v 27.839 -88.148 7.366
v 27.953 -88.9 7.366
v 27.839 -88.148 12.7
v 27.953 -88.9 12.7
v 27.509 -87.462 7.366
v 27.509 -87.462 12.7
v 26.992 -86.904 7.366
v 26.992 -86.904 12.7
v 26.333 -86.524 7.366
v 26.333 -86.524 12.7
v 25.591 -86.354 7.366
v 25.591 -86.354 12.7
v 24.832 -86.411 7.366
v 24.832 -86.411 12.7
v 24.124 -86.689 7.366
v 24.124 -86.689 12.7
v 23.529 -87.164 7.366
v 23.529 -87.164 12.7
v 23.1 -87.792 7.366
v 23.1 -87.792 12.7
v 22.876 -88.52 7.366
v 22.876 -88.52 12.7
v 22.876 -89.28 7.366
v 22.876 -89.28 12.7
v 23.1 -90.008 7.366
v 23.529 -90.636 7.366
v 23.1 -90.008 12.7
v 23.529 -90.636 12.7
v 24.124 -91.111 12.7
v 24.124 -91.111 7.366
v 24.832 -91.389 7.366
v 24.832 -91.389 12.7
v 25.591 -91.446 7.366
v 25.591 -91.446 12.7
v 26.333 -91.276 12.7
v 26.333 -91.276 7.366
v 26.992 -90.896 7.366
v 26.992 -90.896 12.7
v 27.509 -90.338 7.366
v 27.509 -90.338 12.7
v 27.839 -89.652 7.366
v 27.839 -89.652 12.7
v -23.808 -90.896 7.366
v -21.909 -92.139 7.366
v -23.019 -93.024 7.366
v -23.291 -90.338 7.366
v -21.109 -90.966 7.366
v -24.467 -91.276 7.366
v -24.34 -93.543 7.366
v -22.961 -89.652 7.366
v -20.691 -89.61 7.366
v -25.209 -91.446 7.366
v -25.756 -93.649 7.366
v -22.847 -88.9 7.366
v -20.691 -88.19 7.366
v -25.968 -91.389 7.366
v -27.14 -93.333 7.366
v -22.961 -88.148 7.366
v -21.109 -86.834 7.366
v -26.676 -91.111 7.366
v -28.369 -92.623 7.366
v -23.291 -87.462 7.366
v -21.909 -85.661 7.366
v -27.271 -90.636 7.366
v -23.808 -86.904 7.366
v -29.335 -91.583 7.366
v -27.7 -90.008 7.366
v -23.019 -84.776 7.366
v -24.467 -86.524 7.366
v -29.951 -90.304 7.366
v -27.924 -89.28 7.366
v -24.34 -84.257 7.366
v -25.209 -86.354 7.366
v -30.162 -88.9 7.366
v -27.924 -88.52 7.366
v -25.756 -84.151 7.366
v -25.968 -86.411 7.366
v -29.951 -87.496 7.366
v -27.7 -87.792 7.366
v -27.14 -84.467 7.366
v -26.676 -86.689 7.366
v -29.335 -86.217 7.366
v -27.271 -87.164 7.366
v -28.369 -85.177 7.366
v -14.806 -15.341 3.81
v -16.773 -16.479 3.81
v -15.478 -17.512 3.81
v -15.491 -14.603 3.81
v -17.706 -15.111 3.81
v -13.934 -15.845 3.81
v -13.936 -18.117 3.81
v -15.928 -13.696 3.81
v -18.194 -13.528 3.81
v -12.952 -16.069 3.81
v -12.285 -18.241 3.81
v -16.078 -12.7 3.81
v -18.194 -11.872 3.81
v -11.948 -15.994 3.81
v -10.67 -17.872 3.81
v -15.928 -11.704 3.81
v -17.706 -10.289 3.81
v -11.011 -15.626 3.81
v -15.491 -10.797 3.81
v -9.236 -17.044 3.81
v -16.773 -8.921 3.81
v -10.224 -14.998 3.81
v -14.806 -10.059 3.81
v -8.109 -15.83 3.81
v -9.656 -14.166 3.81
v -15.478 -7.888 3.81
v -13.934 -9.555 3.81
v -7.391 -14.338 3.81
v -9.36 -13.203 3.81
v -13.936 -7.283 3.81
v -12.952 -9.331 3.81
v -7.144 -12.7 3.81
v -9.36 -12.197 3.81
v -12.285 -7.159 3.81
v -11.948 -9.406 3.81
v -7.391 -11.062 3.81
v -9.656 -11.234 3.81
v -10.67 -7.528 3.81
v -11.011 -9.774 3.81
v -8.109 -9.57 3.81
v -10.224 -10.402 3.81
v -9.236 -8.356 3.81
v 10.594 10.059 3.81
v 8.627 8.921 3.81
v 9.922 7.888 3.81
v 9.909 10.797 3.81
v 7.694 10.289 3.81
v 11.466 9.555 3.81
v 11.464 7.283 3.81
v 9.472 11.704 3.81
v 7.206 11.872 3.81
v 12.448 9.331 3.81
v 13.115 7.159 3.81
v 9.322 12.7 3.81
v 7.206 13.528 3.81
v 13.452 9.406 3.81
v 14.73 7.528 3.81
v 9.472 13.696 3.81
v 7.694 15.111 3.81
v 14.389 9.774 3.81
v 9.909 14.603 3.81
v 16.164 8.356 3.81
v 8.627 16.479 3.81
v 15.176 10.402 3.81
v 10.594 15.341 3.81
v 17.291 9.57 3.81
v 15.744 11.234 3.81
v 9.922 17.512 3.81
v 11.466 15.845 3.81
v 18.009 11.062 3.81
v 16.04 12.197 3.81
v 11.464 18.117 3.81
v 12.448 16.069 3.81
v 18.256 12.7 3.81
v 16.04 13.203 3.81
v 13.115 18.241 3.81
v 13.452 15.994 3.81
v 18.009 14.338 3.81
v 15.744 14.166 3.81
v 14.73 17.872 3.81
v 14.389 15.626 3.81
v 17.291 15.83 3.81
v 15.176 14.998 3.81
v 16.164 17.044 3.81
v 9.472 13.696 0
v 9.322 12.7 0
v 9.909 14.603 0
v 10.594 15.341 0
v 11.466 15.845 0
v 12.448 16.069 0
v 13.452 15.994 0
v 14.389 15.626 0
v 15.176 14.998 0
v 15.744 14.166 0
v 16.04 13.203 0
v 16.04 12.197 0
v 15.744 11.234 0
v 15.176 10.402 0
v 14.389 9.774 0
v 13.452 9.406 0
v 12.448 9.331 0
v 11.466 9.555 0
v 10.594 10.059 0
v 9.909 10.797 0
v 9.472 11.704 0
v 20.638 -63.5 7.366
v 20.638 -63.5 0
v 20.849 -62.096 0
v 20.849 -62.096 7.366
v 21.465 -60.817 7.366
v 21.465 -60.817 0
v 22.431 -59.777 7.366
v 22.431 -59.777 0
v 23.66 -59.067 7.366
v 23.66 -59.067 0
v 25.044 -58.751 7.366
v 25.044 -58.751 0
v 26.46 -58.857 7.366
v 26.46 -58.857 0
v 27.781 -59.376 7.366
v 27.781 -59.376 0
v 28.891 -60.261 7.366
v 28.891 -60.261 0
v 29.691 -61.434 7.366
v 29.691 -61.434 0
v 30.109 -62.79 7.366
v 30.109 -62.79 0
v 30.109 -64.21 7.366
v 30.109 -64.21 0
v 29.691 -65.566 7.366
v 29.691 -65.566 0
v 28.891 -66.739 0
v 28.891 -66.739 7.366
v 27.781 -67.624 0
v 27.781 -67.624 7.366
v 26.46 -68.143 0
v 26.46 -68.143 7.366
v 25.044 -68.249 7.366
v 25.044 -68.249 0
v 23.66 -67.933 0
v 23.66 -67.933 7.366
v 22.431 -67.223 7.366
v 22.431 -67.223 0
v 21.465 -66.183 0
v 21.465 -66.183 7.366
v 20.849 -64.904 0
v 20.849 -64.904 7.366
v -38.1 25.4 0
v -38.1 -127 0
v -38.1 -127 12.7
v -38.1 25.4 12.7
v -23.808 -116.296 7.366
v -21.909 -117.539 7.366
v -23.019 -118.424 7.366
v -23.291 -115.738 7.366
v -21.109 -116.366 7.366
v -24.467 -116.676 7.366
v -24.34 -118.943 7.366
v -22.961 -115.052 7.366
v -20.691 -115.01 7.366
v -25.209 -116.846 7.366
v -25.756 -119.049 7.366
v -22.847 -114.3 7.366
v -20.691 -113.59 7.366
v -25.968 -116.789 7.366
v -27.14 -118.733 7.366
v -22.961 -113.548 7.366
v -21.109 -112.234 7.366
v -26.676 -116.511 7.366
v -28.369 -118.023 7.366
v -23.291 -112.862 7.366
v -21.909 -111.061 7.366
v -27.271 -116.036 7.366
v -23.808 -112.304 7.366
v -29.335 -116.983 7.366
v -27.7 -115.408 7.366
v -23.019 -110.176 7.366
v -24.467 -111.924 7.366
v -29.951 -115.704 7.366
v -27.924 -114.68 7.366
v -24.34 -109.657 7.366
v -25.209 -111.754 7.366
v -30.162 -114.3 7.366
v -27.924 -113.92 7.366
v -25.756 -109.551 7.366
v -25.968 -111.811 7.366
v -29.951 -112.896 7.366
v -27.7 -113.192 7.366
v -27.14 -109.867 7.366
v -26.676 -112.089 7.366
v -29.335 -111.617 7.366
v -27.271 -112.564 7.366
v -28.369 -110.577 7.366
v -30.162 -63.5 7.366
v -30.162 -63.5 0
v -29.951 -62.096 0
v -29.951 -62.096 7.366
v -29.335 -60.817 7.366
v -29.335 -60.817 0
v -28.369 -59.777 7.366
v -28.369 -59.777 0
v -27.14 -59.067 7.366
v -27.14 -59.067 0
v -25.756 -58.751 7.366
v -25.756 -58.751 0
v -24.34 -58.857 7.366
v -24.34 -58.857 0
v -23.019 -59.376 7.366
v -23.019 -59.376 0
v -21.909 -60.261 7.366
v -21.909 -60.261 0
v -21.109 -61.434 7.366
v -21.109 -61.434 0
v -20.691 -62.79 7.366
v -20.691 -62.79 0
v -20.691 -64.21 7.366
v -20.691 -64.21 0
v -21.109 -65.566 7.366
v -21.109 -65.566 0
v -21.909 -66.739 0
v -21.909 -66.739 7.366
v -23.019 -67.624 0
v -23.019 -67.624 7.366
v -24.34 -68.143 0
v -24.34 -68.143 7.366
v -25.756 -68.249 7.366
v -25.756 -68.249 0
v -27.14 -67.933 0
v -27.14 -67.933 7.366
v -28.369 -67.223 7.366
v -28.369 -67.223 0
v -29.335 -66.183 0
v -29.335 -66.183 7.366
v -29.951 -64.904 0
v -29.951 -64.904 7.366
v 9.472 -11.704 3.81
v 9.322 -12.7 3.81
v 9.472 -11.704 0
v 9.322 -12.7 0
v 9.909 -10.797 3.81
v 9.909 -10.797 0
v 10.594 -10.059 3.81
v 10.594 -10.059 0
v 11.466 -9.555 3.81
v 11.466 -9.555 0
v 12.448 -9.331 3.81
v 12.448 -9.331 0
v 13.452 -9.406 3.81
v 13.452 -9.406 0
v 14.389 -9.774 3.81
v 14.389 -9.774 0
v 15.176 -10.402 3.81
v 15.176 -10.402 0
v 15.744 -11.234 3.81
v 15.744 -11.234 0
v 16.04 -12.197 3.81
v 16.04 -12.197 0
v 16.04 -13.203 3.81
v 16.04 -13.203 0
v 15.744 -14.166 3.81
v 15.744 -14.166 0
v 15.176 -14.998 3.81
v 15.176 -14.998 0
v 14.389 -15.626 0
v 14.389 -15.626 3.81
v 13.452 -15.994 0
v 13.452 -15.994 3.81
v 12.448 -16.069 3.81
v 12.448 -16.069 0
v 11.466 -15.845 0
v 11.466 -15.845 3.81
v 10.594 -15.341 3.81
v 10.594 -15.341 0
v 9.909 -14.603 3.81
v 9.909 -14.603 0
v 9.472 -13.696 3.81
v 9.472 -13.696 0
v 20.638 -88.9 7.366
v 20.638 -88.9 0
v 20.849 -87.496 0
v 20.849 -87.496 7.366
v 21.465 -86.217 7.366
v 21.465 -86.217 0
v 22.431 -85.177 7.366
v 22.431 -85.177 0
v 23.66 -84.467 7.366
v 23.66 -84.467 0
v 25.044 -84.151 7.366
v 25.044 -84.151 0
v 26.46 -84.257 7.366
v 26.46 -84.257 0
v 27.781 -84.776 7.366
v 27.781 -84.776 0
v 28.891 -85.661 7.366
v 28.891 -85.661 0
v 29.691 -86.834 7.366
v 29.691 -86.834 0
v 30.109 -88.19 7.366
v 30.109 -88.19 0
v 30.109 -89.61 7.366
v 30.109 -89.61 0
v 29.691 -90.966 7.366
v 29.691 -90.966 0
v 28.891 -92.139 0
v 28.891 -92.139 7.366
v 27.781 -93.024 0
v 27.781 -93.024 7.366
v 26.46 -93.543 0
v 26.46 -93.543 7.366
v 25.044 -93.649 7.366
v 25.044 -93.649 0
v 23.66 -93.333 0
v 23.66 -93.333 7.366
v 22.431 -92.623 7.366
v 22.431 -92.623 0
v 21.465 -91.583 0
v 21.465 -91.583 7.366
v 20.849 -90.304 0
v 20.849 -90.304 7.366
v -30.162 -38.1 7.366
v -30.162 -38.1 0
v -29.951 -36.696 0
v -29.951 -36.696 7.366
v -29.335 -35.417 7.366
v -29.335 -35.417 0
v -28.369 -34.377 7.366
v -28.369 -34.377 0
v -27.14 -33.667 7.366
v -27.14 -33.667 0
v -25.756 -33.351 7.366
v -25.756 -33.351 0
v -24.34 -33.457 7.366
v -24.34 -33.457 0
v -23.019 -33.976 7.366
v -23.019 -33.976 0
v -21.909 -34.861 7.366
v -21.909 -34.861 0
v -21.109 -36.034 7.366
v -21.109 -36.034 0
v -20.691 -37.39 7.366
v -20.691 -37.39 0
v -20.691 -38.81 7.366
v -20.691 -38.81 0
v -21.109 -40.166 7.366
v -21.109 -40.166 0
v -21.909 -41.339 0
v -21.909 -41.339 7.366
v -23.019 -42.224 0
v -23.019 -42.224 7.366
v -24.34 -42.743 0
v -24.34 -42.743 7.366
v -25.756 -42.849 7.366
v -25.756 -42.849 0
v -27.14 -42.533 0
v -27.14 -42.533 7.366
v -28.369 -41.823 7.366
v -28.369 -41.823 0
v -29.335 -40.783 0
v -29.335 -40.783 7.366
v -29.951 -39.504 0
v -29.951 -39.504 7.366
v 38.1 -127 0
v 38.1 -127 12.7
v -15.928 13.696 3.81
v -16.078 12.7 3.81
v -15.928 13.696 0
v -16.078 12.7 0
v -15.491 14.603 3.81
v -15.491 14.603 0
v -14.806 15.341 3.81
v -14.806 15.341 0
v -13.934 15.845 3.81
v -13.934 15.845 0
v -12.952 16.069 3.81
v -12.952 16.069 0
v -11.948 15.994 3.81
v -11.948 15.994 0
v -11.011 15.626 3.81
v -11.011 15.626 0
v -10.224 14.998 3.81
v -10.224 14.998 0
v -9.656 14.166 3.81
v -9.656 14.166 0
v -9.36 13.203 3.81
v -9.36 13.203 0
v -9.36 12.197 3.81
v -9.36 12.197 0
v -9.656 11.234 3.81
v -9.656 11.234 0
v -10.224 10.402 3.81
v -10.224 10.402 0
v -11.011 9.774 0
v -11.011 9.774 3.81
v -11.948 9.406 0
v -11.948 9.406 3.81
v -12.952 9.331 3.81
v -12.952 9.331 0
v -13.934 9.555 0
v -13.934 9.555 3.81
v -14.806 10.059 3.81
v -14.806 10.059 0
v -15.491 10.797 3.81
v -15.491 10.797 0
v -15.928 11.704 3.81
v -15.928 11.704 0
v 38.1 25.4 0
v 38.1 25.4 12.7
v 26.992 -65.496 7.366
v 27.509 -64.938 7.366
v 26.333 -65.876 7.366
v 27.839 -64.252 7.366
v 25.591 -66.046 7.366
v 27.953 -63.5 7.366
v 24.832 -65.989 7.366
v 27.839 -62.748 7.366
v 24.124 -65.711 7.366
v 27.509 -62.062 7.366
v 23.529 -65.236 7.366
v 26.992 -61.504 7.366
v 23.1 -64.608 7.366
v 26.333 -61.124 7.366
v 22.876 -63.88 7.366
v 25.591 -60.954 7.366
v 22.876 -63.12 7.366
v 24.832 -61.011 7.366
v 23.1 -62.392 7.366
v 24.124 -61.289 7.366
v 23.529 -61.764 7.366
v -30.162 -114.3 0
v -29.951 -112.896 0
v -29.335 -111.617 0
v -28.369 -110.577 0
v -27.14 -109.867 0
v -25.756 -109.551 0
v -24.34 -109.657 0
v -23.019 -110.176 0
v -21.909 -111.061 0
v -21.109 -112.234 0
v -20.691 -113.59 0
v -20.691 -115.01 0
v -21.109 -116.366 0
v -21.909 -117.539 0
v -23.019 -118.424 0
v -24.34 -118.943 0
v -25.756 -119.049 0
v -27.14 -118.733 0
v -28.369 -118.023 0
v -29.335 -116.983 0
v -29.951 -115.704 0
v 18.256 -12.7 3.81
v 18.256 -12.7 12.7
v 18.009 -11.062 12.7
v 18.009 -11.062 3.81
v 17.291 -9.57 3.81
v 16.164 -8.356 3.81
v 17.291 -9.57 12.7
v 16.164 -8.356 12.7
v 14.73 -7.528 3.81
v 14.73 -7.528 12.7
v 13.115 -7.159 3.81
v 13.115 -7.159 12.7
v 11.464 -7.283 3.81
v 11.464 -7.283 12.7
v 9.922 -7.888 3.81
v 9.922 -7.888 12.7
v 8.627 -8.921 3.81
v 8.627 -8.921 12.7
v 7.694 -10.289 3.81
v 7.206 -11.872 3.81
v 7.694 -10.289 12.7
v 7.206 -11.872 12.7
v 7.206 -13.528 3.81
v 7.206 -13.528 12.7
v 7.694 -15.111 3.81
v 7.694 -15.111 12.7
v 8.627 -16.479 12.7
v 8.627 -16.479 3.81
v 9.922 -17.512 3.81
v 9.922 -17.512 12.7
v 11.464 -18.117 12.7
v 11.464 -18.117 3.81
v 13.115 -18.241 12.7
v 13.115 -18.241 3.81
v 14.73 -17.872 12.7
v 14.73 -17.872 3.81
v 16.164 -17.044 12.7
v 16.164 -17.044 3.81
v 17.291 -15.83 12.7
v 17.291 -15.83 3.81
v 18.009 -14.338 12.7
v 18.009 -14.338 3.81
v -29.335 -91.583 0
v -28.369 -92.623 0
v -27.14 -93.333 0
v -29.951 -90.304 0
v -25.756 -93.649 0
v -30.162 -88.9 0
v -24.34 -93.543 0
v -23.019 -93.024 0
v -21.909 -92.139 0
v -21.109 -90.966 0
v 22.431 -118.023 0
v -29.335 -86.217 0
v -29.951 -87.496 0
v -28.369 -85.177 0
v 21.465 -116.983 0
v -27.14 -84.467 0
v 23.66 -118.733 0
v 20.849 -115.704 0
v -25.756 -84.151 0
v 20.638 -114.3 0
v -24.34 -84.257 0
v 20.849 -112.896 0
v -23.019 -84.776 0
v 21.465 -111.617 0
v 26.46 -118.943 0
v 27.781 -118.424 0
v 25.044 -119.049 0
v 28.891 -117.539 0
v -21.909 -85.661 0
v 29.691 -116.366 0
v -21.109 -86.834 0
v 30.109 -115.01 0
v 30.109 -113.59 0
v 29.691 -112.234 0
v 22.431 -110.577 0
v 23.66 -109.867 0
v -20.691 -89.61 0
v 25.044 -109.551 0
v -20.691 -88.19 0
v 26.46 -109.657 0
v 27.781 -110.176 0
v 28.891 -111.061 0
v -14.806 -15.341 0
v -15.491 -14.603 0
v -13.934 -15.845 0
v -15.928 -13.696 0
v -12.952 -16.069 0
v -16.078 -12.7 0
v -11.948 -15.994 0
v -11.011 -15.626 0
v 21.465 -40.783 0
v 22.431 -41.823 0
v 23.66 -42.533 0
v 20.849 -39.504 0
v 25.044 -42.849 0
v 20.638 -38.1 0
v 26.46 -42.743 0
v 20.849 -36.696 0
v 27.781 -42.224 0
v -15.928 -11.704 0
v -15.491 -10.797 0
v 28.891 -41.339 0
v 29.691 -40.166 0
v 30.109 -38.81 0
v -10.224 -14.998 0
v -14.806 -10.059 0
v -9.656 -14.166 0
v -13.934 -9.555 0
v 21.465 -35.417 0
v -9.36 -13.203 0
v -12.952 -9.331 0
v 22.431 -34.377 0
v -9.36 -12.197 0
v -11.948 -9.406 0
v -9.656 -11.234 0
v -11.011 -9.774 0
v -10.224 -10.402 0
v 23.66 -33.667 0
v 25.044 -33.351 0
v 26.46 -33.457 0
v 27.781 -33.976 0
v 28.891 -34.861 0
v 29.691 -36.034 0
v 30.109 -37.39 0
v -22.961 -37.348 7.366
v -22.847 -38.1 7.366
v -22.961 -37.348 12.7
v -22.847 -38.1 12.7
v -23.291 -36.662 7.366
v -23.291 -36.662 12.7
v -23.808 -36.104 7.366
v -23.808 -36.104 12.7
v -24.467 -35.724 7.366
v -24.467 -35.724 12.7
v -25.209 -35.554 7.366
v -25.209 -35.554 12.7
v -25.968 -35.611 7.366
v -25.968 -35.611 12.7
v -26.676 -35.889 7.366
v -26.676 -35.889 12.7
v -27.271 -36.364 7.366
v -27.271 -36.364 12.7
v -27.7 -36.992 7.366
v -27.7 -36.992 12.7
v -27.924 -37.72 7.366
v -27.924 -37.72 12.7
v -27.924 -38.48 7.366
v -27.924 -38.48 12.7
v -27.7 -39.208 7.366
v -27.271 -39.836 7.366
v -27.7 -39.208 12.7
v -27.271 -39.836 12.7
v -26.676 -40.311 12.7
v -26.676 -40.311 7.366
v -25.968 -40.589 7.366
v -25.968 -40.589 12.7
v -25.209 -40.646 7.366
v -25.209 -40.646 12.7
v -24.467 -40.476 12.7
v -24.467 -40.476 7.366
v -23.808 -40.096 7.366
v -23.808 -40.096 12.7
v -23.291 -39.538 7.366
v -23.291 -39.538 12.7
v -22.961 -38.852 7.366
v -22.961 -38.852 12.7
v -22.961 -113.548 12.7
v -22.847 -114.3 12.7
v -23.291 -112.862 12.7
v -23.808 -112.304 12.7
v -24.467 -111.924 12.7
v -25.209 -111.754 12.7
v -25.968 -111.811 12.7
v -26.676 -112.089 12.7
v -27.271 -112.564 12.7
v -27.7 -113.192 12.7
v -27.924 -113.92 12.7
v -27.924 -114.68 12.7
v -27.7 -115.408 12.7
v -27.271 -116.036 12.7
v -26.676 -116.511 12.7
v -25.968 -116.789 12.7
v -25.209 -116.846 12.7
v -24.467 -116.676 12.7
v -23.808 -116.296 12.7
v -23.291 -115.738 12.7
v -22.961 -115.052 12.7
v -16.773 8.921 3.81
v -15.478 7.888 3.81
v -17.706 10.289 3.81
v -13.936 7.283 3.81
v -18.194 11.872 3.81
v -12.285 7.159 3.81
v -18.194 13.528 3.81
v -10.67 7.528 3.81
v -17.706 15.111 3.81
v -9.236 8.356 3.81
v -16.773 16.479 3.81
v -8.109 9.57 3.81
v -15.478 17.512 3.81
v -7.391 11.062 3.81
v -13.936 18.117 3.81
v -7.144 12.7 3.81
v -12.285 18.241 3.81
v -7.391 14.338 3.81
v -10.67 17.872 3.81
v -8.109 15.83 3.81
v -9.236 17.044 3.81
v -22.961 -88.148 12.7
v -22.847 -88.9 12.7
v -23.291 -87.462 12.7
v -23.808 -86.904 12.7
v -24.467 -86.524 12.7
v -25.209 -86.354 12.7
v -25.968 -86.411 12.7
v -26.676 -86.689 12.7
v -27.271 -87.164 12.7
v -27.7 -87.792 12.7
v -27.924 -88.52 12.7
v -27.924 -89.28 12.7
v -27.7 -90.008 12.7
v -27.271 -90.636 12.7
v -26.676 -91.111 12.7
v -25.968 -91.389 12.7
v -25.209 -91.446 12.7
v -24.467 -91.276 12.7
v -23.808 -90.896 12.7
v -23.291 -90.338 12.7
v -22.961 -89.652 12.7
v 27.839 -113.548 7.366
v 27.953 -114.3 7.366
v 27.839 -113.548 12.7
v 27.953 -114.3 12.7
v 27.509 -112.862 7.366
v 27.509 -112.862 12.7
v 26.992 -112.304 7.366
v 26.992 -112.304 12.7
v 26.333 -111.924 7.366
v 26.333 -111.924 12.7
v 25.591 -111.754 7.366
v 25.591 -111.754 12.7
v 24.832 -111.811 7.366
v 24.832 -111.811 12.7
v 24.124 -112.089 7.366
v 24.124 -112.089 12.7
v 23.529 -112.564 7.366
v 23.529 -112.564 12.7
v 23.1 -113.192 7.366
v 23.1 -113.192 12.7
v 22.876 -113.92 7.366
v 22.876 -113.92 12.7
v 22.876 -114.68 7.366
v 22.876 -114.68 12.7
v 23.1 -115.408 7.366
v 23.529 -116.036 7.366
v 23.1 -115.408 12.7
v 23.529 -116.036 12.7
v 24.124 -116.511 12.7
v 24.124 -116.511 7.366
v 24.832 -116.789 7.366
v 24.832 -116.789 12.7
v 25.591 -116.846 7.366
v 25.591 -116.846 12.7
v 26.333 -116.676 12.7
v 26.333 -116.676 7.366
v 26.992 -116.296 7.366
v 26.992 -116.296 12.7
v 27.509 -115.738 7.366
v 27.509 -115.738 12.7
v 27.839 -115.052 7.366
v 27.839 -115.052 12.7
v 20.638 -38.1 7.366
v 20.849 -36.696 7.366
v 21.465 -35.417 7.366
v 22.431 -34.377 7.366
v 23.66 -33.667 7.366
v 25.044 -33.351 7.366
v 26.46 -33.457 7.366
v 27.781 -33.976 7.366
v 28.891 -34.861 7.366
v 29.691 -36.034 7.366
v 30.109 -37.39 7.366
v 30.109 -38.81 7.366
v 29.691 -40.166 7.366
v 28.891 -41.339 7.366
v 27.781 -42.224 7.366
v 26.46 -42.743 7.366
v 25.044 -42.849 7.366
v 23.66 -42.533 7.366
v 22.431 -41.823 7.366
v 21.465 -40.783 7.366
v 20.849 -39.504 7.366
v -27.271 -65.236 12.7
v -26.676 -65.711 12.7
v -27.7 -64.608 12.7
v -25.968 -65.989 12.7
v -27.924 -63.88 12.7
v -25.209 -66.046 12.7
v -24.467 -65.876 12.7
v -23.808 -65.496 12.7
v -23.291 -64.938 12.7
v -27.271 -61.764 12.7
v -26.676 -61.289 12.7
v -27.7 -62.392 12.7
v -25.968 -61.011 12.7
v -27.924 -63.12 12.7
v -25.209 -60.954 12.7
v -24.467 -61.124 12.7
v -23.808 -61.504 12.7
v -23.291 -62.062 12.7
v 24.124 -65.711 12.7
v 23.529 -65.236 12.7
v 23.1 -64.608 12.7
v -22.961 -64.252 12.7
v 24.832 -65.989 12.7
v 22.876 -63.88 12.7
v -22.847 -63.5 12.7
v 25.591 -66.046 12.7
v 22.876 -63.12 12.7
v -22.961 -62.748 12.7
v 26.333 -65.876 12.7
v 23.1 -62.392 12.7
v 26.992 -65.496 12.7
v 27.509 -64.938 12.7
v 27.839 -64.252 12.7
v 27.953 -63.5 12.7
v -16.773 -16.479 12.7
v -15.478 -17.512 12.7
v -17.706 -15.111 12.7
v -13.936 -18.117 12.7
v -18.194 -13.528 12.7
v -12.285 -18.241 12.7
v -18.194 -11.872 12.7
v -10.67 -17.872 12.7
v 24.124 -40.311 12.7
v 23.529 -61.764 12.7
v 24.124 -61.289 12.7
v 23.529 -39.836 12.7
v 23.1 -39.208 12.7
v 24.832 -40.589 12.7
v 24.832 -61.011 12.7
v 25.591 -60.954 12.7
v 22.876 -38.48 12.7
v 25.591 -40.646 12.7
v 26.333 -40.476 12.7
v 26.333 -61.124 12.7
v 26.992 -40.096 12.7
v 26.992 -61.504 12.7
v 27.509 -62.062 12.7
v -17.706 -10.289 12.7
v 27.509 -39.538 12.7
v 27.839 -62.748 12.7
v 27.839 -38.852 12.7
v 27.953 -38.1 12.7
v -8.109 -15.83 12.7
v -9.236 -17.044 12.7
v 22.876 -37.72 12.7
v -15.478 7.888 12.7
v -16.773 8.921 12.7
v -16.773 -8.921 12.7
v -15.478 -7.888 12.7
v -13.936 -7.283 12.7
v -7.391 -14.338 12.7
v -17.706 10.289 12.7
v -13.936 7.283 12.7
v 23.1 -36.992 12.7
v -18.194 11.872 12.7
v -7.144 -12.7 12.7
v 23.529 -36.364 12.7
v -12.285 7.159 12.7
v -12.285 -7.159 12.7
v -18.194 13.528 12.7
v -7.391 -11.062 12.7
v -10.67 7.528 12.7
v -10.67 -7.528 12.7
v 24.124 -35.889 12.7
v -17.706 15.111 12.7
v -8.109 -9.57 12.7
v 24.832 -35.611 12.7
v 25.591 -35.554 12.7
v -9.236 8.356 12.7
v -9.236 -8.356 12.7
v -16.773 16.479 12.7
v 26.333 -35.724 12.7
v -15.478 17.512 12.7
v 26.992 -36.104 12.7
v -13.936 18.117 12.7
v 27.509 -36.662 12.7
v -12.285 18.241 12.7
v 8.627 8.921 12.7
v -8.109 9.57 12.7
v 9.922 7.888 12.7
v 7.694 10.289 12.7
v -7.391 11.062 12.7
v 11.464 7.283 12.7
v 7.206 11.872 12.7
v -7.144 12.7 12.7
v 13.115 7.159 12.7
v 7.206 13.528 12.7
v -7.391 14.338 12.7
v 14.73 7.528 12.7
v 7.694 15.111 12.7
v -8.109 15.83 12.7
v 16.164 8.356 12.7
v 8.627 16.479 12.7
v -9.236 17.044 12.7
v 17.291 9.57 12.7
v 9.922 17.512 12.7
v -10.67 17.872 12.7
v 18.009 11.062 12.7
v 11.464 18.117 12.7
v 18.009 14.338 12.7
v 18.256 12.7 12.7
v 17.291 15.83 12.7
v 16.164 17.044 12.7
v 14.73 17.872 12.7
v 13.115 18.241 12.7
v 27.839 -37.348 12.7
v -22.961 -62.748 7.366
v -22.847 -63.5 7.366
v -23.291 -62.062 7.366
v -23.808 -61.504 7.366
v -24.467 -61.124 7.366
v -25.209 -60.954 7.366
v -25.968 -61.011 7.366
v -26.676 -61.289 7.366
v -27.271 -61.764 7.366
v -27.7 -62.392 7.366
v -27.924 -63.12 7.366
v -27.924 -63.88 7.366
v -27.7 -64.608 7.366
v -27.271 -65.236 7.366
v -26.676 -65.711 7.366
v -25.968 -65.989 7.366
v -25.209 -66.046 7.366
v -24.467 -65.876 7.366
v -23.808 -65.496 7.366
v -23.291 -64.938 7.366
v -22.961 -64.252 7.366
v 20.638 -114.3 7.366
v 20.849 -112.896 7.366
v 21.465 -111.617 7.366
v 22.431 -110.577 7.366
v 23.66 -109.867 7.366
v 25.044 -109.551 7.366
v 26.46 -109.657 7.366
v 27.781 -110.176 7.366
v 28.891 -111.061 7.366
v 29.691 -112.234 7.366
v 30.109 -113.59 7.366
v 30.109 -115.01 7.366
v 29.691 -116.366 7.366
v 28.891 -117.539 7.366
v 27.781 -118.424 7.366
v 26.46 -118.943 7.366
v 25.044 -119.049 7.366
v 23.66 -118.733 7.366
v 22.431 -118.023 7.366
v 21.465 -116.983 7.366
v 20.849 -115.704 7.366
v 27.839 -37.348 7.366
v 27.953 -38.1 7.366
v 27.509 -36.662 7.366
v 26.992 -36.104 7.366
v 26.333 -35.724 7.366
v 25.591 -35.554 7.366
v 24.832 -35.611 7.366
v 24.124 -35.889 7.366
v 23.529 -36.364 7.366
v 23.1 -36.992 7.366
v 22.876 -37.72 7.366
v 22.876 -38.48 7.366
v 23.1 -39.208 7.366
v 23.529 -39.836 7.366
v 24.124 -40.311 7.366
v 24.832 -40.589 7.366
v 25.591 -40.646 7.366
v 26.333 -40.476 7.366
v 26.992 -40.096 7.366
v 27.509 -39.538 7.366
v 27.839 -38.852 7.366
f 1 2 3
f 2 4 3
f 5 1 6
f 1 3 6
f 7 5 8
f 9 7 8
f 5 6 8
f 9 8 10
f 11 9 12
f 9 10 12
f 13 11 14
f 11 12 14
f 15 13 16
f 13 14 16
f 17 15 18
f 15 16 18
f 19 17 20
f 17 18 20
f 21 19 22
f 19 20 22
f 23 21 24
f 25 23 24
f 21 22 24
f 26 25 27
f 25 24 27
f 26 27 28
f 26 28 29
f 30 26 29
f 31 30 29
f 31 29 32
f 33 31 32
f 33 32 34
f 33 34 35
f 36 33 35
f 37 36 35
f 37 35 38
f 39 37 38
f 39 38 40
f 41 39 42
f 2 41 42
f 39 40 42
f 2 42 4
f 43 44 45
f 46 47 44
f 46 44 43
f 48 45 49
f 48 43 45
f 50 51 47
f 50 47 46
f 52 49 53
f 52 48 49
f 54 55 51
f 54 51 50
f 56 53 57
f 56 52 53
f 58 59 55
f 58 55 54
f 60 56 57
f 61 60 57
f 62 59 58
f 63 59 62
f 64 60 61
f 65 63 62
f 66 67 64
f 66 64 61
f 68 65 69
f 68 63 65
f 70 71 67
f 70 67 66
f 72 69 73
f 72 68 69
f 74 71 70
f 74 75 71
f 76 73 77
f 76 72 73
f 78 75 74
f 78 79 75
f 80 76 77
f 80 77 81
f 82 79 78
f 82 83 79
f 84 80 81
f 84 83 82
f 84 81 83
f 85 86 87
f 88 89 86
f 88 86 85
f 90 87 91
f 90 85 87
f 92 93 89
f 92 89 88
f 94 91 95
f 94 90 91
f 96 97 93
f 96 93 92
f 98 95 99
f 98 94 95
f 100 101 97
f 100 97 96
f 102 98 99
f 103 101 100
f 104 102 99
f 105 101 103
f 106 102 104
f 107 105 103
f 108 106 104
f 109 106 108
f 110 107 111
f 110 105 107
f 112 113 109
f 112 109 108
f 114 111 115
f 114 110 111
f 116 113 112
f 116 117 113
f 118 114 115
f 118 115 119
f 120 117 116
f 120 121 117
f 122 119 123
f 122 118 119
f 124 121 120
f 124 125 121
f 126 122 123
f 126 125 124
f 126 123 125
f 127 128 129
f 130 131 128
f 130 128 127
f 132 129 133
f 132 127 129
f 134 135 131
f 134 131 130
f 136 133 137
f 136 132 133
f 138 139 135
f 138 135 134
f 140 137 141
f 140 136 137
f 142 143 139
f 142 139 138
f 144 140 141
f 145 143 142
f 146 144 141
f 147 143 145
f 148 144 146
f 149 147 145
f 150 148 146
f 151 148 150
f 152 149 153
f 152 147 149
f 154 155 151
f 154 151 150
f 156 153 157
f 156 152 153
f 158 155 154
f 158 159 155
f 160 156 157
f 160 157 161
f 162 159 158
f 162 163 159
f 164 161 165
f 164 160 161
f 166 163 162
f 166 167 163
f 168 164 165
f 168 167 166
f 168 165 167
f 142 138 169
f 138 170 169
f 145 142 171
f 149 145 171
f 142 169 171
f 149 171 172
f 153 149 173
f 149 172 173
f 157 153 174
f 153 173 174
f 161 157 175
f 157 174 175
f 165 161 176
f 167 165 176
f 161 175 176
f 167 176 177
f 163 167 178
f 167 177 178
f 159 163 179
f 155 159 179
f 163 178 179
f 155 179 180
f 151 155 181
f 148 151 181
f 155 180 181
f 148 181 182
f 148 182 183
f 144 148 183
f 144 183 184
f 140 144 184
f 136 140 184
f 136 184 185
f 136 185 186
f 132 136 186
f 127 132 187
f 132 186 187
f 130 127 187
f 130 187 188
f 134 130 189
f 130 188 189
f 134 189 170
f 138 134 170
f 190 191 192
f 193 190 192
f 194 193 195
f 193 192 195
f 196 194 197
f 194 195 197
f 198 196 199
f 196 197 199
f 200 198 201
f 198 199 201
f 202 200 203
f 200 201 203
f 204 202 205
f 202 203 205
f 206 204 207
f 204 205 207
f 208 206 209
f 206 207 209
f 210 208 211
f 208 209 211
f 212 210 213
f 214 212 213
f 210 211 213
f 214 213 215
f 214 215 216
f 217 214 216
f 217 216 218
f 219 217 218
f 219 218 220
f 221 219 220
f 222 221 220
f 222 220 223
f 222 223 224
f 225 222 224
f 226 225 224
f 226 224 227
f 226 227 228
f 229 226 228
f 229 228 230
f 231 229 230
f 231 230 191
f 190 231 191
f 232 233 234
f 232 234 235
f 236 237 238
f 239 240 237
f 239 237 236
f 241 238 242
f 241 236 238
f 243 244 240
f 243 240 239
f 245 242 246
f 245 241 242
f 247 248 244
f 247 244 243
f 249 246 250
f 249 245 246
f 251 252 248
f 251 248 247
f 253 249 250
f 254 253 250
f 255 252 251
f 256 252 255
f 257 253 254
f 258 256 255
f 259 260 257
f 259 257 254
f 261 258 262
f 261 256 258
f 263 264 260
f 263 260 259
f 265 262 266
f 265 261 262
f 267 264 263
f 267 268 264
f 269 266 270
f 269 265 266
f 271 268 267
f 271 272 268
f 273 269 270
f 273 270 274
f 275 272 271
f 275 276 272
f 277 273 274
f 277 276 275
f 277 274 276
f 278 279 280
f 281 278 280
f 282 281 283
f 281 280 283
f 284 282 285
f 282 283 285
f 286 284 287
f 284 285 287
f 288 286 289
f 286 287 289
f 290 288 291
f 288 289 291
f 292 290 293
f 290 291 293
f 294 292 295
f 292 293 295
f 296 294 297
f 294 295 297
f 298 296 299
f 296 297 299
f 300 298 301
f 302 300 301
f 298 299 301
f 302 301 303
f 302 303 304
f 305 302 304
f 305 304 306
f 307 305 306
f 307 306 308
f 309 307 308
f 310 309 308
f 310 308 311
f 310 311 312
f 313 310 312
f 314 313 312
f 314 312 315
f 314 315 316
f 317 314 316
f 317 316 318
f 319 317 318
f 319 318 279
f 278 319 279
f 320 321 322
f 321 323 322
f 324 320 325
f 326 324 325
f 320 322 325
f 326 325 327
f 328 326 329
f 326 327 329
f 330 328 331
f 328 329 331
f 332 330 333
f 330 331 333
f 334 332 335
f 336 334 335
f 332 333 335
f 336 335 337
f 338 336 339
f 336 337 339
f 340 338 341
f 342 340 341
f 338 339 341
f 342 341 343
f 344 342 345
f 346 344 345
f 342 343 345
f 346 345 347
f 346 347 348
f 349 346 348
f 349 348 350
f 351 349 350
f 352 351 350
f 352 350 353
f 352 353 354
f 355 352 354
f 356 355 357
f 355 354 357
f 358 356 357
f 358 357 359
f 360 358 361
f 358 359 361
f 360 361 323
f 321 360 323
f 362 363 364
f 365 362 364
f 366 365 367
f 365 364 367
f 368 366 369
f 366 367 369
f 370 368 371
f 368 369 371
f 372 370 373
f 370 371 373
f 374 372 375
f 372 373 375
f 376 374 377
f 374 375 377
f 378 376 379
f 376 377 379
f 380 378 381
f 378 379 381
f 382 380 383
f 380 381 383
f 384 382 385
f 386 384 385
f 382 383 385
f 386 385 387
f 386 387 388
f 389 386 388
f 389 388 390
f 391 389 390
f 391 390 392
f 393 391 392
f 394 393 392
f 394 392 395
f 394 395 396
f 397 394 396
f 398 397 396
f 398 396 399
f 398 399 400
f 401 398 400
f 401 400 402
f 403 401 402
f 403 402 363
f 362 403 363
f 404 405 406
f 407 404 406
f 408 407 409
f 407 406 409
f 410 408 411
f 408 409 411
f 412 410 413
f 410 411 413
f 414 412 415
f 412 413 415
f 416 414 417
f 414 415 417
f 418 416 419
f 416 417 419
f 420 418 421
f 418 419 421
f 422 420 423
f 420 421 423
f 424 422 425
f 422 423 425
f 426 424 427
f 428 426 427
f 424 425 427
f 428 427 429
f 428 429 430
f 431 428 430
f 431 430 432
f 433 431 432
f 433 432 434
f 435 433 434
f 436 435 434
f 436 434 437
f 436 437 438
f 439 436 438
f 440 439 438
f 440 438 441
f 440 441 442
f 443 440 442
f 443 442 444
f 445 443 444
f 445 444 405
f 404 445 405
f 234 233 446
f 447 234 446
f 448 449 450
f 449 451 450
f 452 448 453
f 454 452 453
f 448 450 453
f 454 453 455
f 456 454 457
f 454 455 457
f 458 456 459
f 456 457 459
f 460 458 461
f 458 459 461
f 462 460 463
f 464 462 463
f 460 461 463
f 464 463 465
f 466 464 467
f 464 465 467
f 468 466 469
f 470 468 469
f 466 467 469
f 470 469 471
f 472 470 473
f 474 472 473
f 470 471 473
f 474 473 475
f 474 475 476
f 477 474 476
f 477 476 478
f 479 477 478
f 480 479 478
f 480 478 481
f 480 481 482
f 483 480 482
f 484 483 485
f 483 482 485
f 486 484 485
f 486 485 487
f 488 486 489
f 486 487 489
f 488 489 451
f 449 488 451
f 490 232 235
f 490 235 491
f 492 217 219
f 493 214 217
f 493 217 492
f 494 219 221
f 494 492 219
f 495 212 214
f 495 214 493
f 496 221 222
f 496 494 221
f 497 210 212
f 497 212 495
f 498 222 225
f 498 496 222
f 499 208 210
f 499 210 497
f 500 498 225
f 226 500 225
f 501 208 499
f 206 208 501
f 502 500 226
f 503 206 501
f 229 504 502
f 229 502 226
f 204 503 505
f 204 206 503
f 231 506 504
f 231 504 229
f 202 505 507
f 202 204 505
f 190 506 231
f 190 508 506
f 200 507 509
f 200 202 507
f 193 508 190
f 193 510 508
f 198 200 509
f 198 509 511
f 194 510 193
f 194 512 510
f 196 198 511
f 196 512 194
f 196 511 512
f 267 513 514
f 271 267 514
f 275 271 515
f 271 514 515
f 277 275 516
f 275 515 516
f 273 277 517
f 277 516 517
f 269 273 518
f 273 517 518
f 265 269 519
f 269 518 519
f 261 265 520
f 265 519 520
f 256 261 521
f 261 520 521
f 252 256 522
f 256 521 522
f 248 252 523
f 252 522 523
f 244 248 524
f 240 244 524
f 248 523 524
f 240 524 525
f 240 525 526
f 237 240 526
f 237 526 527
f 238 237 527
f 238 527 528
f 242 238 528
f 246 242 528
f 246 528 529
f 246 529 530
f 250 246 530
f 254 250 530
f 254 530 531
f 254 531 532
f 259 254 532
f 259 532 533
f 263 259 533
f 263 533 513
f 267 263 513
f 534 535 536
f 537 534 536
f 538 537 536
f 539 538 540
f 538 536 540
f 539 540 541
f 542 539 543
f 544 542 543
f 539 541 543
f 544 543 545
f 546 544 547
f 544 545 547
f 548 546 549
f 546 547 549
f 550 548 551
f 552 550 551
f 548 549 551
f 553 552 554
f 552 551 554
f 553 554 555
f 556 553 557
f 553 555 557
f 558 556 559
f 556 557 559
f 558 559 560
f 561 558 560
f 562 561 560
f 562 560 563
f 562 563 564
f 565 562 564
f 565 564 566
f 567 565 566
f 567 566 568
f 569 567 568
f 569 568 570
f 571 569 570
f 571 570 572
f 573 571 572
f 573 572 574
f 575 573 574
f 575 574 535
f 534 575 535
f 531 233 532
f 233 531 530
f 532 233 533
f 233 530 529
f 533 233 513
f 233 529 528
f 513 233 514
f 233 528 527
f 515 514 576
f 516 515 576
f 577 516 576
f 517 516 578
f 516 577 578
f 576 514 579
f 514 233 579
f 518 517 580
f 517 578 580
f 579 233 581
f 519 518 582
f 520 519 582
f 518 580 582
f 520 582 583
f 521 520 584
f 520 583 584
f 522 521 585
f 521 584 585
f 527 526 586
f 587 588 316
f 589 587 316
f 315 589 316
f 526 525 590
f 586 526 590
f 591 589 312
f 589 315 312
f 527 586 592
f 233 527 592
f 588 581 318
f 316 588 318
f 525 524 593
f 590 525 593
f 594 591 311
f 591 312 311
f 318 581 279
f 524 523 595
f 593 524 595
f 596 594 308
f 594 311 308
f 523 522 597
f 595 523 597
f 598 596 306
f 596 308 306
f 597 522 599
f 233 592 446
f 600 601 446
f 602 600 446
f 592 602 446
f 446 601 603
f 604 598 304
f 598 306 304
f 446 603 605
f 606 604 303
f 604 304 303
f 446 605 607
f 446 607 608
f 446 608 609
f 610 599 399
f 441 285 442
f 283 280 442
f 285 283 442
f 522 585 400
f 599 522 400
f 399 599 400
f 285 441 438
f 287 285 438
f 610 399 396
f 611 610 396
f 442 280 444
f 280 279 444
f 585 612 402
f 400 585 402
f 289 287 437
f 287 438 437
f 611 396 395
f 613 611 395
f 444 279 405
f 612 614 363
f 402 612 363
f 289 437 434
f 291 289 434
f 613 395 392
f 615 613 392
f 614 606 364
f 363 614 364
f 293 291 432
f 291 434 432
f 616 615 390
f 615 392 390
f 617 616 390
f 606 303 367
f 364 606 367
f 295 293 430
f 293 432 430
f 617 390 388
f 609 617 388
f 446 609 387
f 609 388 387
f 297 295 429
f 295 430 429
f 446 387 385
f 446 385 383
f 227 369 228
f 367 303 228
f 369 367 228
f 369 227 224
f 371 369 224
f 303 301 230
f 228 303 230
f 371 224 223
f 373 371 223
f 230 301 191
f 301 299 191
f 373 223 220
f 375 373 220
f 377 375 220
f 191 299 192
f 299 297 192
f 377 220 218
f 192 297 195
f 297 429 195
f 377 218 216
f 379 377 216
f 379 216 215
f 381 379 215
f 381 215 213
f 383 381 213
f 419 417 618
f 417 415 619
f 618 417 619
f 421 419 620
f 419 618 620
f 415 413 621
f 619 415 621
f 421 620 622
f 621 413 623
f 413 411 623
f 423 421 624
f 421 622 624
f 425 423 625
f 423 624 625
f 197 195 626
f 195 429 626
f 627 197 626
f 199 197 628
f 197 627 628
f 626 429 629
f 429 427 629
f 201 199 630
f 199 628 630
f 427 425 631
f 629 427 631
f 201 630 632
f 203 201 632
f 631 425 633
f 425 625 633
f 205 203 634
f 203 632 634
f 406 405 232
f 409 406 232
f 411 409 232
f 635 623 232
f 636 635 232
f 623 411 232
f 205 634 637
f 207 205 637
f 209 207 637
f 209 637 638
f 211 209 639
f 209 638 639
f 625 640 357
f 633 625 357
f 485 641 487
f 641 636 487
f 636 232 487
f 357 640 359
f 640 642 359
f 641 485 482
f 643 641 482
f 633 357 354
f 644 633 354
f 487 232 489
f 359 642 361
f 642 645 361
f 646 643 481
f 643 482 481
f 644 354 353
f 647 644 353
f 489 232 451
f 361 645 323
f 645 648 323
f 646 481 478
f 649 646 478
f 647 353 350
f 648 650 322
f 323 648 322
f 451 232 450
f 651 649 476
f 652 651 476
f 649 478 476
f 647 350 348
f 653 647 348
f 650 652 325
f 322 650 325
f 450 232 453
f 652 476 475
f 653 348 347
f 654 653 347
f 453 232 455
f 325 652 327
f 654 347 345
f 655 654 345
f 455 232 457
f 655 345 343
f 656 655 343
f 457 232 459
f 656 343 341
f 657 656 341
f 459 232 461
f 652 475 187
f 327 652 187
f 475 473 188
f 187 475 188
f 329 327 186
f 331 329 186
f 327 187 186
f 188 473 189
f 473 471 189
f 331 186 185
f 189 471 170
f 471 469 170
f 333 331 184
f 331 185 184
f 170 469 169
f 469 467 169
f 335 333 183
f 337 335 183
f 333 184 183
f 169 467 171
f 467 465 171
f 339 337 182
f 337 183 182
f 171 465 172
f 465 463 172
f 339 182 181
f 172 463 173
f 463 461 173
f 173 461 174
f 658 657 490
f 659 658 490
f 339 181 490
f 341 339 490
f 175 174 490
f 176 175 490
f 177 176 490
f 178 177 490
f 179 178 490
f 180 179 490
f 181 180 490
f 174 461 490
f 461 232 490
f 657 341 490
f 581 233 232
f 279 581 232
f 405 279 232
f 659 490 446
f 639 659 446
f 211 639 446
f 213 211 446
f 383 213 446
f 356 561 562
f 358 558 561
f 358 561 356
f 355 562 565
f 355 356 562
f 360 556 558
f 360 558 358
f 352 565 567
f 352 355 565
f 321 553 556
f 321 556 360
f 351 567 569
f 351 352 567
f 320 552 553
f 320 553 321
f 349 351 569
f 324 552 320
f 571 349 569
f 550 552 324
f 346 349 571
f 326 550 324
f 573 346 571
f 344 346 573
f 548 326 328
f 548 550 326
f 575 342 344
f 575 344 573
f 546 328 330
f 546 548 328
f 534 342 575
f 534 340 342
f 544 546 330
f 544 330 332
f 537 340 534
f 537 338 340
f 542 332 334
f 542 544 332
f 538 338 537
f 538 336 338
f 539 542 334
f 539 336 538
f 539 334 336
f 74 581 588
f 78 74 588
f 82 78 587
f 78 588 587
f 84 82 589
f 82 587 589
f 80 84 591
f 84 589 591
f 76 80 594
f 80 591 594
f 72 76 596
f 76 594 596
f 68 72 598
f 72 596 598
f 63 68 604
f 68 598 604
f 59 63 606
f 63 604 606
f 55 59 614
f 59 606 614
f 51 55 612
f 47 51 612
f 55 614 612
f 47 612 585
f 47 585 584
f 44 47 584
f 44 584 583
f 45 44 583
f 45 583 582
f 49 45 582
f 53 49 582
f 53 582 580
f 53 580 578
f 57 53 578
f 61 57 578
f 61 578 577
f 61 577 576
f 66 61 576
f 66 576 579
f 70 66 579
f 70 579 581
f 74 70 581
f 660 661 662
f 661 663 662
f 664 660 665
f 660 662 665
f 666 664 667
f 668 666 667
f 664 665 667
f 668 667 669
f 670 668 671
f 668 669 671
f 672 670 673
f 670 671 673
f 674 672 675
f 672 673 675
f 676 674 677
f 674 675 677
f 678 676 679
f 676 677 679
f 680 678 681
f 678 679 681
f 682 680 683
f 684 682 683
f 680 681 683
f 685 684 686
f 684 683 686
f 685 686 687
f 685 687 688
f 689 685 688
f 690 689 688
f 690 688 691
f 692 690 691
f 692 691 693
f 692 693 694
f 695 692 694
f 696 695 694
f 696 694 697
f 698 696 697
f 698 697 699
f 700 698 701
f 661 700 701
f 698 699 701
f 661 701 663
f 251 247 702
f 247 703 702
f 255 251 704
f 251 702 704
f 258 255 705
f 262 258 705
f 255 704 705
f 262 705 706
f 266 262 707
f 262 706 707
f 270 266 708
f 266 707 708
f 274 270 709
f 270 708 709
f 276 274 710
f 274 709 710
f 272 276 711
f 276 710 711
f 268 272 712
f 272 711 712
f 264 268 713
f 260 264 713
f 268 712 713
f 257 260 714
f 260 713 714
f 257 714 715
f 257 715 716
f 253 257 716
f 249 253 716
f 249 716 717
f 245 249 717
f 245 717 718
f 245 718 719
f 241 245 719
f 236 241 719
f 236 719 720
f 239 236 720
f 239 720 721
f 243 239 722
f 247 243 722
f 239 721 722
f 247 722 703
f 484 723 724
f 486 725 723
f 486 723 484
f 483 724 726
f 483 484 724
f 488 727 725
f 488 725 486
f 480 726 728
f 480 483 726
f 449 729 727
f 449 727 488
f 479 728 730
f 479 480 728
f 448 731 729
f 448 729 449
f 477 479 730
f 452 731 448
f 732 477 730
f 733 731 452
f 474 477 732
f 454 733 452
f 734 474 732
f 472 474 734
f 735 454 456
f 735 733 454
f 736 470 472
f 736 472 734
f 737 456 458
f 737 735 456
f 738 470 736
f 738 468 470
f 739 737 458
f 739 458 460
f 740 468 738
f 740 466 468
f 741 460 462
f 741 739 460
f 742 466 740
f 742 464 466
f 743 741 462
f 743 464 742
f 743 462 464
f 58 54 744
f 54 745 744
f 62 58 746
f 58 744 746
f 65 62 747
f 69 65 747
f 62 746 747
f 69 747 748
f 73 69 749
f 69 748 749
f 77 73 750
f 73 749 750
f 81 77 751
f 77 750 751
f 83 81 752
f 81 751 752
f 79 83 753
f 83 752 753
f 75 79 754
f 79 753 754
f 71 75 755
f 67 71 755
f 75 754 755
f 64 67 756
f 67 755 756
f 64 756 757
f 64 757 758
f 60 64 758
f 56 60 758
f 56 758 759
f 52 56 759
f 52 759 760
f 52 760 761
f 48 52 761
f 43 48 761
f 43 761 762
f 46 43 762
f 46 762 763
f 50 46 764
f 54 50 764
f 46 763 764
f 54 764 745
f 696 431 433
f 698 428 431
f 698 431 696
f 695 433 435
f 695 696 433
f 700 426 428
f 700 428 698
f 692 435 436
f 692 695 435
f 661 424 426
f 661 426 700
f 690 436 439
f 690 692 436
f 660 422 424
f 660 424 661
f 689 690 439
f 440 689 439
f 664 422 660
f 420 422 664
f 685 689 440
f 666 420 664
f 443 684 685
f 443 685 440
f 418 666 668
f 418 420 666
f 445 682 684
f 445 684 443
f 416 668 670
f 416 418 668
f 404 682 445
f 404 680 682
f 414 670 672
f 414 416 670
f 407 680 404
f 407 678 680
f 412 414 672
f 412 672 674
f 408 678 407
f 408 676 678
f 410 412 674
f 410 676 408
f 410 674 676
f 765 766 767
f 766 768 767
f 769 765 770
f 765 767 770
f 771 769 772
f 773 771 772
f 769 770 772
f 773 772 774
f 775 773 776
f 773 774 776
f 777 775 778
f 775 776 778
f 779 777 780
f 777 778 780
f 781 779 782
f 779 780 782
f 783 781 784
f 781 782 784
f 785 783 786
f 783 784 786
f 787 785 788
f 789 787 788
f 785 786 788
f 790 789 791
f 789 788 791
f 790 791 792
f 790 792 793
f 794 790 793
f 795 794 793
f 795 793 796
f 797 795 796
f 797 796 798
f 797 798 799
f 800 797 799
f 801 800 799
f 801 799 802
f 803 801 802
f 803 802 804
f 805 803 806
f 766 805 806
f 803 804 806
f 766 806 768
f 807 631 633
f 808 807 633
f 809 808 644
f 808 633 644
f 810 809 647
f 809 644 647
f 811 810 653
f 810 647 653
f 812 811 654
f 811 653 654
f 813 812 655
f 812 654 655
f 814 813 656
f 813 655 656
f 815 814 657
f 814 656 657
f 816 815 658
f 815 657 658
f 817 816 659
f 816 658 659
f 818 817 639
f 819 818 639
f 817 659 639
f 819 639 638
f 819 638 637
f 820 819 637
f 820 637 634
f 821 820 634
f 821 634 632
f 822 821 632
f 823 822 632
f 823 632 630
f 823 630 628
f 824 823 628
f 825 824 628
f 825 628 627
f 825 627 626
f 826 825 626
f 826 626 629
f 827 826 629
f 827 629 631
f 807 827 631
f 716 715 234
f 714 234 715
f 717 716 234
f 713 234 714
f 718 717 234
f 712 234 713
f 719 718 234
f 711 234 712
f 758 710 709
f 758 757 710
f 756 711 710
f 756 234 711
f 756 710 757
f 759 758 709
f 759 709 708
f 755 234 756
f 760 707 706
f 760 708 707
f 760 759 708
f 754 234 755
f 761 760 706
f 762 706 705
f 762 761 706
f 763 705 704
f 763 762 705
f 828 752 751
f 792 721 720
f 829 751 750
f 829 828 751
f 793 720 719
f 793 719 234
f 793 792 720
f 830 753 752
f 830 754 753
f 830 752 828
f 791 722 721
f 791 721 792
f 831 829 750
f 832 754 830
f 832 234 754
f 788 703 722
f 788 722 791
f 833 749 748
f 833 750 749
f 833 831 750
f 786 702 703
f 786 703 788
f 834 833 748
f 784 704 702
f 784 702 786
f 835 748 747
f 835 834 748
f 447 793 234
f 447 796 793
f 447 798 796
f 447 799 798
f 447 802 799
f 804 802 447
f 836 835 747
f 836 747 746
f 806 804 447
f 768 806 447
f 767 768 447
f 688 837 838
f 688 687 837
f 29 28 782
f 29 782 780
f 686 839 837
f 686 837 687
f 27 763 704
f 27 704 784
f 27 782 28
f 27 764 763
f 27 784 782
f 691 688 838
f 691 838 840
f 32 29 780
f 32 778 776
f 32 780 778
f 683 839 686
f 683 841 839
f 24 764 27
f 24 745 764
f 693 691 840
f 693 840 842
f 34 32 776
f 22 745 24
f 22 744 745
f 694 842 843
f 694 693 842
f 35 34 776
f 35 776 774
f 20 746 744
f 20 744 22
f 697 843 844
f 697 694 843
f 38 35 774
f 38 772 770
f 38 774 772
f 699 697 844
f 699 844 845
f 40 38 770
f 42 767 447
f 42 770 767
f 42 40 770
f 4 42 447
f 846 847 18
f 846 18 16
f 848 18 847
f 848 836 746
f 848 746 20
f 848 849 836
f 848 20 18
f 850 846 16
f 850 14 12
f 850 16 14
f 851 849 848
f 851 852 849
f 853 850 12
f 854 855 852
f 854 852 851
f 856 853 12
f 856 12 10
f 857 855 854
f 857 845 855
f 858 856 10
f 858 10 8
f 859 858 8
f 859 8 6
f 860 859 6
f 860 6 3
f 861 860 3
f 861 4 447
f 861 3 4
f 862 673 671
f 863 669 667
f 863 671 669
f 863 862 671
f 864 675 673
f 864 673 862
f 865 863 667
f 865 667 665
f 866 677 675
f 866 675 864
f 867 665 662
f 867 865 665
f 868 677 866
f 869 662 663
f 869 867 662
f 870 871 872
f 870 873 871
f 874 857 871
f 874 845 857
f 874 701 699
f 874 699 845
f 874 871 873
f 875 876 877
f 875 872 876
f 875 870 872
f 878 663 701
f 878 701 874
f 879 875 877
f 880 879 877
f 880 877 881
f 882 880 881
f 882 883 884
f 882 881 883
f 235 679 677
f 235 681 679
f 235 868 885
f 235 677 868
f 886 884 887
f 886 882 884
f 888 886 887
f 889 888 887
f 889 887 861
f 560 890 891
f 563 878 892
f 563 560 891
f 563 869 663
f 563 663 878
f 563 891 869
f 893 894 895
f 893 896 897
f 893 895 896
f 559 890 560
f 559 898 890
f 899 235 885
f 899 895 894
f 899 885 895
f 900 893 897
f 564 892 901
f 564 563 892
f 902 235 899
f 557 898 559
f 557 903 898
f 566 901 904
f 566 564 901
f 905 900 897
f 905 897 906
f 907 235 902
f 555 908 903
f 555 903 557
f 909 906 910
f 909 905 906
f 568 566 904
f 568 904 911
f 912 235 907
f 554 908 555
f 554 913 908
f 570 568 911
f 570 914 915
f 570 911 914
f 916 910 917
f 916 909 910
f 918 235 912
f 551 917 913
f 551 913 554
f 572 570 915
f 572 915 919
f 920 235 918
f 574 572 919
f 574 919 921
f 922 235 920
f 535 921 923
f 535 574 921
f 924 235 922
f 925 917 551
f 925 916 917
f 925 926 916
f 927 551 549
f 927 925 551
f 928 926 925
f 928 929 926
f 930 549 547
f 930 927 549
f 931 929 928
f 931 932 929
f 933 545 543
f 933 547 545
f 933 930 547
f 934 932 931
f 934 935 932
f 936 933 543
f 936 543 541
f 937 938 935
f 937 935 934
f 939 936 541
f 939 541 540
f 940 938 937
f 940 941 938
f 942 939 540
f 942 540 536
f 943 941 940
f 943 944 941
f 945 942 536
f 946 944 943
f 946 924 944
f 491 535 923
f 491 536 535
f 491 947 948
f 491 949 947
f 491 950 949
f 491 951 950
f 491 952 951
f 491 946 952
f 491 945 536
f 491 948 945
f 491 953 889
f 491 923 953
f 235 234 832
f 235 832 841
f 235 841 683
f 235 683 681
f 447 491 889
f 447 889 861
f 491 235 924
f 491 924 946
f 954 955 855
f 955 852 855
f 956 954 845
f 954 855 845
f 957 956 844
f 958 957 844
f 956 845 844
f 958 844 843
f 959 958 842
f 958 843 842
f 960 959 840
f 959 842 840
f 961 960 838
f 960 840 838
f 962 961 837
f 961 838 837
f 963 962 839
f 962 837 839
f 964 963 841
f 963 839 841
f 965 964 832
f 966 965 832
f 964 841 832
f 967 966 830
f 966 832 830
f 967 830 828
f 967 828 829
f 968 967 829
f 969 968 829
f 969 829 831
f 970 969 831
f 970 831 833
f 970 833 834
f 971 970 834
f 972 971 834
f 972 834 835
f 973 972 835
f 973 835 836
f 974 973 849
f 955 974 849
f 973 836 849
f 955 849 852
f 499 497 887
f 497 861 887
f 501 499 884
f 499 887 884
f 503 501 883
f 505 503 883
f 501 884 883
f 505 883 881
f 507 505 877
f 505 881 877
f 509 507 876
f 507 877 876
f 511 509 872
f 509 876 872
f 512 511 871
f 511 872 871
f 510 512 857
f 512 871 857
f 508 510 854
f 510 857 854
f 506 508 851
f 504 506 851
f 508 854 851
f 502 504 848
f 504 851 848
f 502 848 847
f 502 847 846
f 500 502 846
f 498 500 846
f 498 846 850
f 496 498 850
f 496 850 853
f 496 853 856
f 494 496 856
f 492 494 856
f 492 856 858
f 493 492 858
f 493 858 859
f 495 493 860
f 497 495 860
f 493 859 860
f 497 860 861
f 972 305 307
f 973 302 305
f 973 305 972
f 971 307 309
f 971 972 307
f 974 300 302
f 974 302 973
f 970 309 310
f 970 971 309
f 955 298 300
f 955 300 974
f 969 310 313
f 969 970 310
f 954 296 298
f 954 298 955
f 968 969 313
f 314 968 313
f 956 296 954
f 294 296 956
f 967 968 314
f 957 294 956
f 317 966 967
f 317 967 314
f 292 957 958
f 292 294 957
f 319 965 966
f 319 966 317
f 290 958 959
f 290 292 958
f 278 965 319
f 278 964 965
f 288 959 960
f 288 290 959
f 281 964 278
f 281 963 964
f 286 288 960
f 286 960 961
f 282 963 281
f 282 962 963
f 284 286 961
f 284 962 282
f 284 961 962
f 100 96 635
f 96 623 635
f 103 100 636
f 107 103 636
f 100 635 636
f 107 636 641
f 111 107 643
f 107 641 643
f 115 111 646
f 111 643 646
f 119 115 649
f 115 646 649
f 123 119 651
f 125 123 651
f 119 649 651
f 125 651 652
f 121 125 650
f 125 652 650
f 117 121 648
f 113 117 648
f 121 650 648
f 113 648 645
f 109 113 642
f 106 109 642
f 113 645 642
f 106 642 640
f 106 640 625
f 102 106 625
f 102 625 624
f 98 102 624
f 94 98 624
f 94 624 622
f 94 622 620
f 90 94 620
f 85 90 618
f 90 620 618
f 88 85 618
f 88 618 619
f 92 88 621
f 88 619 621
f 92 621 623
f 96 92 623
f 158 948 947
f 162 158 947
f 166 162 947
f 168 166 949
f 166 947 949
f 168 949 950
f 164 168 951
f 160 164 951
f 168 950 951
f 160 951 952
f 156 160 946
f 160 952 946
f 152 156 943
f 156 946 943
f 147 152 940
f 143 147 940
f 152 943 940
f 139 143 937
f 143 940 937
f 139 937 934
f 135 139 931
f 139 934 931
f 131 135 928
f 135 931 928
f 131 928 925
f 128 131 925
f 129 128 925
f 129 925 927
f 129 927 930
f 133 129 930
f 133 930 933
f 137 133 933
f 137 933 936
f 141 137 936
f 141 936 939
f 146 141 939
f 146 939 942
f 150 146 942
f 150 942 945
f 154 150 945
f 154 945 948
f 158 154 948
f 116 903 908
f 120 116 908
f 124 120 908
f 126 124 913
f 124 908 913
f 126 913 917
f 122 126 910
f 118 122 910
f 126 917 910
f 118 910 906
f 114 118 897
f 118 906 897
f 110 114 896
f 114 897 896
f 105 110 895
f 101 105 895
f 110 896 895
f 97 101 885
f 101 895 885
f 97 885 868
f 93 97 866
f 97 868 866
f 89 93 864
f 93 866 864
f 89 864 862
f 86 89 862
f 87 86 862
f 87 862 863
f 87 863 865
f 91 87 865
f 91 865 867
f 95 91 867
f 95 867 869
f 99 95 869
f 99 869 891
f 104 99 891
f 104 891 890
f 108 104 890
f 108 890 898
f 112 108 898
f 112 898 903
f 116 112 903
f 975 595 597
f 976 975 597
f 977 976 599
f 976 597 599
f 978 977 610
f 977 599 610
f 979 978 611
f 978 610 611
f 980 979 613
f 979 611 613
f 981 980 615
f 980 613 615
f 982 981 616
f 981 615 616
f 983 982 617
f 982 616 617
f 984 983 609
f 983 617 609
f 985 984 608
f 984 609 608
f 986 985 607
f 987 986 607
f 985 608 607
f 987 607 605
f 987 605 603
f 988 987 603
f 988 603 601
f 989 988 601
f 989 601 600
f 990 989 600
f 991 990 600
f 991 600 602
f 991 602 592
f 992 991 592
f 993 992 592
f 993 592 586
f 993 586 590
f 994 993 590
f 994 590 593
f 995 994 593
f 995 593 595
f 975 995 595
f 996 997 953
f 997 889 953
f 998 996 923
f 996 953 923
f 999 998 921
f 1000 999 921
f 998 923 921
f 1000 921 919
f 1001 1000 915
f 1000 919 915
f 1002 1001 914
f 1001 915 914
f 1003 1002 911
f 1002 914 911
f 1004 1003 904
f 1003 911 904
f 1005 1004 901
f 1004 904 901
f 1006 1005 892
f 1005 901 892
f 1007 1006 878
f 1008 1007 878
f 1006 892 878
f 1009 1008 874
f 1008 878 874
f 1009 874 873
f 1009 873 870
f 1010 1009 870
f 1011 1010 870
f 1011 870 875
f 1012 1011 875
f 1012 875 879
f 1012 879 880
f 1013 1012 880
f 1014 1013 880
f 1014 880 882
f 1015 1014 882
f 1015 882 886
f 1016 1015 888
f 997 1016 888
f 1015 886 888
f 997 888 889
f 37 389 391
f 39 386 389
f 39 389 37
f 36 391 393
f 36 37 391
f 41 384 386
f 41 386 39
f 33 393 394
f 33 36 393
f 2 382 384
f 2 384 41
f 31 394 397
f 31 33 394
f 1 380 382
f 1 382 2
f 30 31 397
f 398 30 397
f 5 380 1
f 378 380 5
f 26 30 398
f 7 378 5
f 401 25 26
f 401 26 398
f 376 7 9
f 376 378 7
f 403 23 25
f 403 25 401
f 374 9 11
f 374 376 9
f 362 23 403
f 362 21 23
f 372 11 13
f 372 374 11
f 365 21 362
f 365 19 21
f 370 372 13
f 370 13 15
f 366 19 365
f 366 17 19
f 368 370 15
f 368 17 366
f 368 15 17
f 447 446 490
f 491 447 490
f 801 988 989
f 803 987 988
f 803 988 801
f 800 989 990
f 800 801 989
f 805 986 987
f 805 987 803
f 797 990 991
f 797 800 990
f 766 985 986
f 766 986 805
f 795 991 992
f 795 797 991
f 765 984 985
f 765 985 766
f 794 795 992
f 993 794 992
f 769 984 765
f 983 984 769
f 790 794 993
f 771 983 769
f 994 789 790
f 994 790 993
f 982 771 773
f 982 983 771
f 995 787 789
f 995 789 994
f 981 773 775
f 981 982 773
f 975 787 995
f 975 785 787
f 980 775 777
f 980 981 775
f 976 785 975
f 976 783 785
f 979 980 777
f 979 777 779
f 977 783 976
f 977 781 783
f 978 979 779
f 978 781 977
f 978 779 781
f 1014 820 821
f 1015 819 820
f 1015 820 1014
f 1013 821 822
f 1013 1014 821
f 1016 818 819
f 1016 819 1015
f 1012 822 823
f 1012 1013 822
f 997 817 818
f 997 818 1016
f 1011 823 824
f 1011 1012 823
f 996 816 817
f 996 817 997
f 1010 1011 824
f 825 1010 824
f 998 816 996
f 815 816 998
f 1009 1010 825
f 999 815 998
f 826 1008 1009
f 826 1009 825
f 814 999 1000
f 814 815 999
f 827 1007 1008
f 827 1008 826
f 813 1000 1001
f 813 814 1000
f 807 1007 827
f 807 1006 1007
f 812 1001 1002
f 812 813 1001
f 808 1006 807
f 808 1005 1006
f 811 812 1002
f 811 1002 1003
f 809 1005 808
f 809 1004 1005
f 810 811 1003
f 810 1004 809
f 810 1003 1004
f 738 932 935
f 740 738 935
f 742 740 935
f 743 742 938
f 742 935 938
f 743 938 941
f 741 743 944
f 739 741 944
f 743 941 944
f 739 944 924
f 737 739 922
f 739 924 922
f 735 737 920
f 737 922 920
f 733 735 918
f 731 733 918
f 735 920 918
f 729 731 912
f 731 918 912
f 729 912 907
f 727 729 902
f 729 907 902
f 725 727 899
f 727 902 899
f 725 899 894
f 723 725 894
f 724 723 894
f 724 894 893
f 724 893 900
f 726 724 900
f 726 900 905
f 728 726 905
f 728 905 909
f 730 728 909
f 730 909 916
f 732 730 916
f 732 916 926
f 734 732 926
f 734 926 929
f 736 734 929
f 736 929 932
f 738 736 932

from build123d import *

# Parameters (mm, degrees)
SKETCH1_W                                        = 76.2
SKETCH1_H                                        = 152.4
BOSS_EXTRUDE1_DEPTH                              = 12.7
CBORE_FOR_1_4_SOCKET_HEAD_CAP_SCREW1_D           = 6.7564
CBORE_FOR_1_4_SOCKET_HEAD_CAP_SCREW1_CBORE_D     = 11.1125
CBORE_FOR_1_4_SOCKET_HEAD_CAP_SCREW1_CBORE_DEPTH = 8.89
CBORE_FOR_10_SOCKET_HEAD_CAP_SCREW1_D            = 5.1054
CBORE_FOR_10_SOCKET_HEAD_CAP_SCREW1_CBORE_D      = 9.525
CBORE_FOR_10_SOCKET_HEAD_CAP_SCREW1_CBORE_DEPTH  = 7.366


with BuildPart() as part:
    # Sketch1 → Boss-Extrude1 (new body)
    with BuildSketch(Plane.XY):
        with Locations((0, -50.8)):
            Rectangle(SKETCH1_W, SKETCH1_H)
    extrude(amount=BOSS_EXTRUDE1_DEPTH)

    # CBORE for 1/4 Socket Head Cap Screw1 (through all)
    with Locations(Plane.XY.offset(12.7)):
        with Locations((-12.7, 12.7), (-12.7, -12.7), (12.7, -12.7), (12.7, 12.7)):
            CounterBoreHole(CBORE_FOR_1_4_SOCKET_HEAD_CAP_SCREW1_D / 2, CBORE_FOR_1_4_SOCKET_HEAD_CAP_SCREW1_CBORE_D / 2, CBORE_FOR_1_4_SOCKET_HEAD_CAP_SCREW1_CBORE_DEPTH)

    # CBORE for #10 Socket Head Cap Screw1 (through all)
    with Locations(Plane(origin=(0, 0, 0), x_dir=(-1, 0, 0), z_dir=(0, 0, -1))):
        with Locations((-25.4, -114.3), (25.4, -114.3), (25.4, -88.9), (25.4, -63.5), (25.4, -38.1), (-25.4, -88.9), (-25.4, -63.5), (-25.4, -38.1)):
            CounterBoreHole(CBORE_FOR_10_SOCKET_HEAD_CAP_SCREW1_D / 2, CBORE_FOR_10_SOCKET_HEAD_CAP_SCREW1_CBORE_D / 2, CBORE_FOR_10_SOCKET_HEAD_CAP_SCREW1_CBORE_DEPTH)


solid = part.part
